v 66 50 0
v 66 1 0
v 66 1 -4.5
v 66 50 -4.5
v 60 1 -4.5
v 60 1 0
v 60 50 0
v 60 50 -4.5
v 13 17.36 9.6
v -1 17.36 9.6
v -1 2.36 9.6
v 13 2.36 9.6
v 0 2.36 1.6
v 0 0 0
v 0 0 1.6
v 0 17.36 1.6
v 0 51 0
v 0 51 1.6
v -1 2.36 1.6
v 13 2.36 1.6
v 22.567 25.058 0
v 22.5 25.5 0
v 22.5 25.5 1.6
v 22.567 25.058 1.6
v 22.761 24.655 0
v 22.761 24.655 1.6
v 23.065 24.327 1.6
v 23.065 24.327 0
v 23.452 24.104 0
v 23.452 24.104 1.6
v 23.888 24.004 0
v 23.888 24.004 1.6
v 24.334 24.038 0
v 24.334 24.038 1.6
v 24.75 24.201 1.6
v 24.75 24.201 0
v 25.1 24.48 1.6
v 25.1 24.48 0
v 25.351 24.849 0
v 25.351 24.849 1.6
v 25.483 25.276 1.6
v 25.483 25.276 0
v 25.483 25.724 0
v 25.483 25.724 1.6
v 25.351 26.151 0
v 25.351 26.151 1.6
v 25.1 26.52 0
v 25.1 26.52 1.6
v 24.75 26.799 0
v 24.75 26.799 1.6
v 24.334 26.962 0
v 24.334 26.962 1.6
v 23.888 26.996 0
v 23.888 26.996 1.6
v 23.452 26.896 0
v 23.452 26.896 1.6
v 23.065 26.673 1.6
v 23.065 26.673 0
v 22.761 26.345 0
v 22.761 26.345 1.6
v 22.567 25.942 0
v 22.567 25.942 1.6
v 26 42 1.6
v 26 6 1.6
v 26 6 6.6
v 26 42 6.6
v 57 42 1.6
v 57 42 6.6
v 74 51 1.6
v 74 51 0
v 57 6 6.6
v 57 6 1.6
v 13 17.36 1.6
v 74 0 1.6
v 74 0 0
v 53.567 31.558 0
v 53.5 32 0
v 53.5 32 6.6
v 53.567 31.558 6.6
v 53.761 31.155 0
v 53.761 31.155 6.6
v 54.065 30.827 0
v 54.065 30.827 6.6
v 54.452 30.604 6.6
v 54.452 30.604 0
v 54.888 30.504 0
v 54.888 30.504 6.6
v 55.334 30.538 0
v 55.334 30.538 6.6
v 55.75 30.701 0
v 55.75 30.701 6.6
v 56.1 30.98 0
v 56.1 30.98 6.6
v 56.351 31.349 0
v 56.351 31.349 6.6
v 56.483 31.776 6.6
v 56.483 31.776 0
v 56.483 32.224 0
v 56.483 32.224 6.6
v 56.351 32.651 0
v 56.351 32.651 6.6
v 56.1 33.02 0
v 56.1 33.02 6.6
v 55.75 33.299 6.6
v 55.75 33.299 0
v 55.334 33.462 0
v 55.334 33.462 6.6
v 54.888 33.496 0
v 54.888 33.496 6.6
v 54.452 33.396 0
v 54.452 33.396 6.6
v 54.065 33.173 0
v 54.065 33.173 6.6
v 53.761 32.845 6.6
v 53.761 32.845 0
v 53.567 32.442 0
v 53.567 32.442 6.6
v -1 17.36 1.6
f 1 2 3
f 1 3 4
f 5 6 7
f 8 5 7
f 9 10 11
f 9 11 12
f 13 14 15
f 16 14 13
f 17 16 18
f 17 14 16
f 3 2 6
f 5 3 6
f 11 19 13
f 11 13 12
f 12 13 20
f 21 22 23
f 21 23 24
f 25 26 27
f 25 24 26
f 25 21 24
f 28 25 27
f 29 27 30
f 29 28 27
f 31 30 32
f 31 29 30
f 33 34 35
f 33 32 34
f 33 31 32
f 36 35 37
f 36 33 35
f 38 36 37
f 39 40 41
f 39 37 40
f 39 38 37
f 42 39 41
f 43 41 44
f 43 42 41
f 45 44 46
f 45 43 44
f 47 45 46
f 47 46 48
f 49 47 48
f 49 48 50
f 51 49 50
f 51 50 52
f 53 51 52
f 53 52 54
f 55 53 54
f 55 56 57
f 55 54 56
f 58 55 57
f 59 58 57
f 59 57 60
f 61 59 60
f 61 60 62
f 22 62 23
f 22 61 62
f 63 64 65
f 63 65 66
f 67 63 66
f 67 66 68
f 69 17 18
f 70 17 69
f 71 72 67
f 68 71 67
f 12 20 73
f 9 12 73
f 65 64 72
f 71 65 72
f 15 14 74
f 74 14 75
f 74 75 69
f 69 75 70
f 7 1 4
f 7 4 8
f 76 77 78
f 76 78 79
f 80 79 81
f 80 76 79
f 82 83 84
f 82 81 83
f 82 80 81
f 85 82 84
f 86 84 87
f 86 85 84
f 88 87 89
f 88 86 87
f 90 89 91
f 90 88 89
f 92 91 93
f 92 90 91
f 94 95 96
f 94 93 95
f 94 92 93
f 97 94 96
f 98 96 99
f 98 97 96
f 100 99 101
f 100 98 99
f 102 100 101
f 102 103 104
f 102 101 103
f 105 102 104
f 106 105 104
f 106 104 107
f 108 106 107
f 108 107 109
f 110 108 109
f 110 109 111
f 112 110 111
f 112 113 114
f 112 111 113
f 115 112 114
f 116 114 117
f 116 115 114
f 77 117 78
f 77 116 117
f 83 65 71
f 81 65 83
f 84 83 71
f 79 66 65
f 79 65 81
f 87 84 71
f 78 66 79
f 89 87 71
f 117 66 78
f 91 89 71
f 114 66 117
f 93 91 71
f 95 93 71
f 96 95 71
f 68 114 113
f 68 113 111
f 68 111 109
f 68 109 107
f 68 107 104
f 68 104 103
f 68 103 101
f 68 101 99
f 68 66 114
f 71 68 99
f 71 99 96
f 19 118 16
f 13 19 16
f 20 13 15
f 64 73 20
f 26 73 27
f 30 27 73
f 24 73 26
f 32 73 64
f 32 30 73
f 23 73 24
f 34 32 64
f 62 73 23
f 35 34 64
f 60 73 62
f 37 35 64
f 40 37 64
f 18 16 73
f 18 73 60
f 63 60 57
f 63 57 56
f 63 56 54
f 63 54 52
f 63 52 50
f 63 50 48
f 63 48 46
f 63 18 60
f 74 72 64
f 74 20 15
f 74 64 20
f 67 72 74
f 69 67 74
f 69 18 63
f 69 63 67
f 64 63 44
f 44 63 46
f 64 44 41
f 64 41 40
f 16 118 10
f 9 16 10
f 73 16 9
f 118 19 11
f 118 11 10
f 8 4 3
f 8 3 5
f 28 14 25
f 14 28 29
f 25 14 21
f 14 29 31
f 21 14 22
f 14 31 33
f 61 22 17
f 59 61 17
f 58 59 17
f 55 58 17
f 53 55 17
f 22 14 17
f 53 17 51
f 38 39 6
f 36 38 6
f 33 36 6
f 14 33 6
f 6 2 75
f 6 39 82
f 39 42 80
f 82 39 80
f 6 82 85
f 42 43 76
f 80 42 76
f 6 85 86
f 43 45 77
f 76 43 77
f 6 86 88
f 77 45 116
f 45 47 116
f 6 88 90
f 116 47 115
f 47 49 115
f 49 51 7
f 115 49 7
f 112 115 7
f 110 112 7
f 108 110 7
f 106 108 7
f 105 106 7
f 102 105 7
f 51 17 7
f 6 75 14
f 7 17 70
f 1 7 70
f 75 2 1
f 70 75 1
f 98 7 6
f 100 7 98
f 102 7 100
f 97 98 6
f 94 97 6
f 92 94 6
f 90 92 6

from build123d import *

# Parameters (mm, degrees)
SKETCH1_W               = 74
SKETCH1_H               = 51
BOSS_EXTRUDE1_DEPTH     = 1.6
SKETCH2_W               = 31
SKETCH2_H               = 36
BOSS_EXTRUDE2_DEPTH     = 5
SKETCH3_W               = 14
SKETCH3_H               = 15
BOSS_EXTRUDE3_DEPTH     = 8
SKETCH4_W               = 6
SKETCH4_H               = 49
BOSS_EXTRUDE4_DEPTH     = 4.5
CUT_EXTRUDE1_DEPTH      = 8.5
CUT_EXTRUDE1_DEPTH_BACK = 91.227490268
SKETCH6_R               = 1.5


with BuildPart() as part:
    # Sketch1 → Boss-Extrude1 (new body)
    with BuildSketch(Plane.XY):
        with Locations((37, 25.5)):
            Rectangle(SKETCH1_W, SKETCH1_H)
    extrude(amount=BOSS_EXTRUDE1_DEPTH)

    # Sketch2 → Boss-Extrude2 (add)
    with BuildSketch(Plane.XY.offset(1.6)):
        with Locations((41.5, 24)):
            Rectangle(SKETCH2_W, SKETCH2_H)
    extrude(amount=BOSS_EXTRUDE2_DEPTH)

    # Sketch3 → Boss-Extrude3 (add)
    with BuildSketch(Plane.XY.offset(1.6)):
        with Locations((6, 9.86)):
            Rectangle(SKETCH3_W, SKETCH3_H)
    extrude(amount=BOSS_EXTRUDE3_DEPTH)

    # Sketch4 → Boss-Extrude4 (add)
    with BuildSketch(Plane(origin=(0, 0, 0), x_dir=(-1, 0, 0), z_dir=(0, 0, -1))):
        with Locations((-63, 25.5)):
            Rectangle(SKETCH4_W, SKETCH4_H)
    extrude(amount=BOSS_EXTRUDE4_DEPTH)

    # Sketch6 → Cut-Extrude1 (cut, two sides: drawn at the far end of the back side and taken through both)
    with BuildSketch(Plane.XY.offset(1.6).offset(-CUT_EXTRUDE1_DEPTH_BACK)):
        with Locations(Location((55, 32, 0), (0, 0, 180))):
            Circle(SKETCH6_R)
        with Locations(Location((24, 25.5, 0), (0, 0, 180))):
            Circle(SKETCH6_R)
    extrude(amount=CUT_EXTRUDE1_DEPTH + CUT_EXTRUDE1_DEPTH_BACK, mode=Mode.SUBTRACT)


solid = part.part
